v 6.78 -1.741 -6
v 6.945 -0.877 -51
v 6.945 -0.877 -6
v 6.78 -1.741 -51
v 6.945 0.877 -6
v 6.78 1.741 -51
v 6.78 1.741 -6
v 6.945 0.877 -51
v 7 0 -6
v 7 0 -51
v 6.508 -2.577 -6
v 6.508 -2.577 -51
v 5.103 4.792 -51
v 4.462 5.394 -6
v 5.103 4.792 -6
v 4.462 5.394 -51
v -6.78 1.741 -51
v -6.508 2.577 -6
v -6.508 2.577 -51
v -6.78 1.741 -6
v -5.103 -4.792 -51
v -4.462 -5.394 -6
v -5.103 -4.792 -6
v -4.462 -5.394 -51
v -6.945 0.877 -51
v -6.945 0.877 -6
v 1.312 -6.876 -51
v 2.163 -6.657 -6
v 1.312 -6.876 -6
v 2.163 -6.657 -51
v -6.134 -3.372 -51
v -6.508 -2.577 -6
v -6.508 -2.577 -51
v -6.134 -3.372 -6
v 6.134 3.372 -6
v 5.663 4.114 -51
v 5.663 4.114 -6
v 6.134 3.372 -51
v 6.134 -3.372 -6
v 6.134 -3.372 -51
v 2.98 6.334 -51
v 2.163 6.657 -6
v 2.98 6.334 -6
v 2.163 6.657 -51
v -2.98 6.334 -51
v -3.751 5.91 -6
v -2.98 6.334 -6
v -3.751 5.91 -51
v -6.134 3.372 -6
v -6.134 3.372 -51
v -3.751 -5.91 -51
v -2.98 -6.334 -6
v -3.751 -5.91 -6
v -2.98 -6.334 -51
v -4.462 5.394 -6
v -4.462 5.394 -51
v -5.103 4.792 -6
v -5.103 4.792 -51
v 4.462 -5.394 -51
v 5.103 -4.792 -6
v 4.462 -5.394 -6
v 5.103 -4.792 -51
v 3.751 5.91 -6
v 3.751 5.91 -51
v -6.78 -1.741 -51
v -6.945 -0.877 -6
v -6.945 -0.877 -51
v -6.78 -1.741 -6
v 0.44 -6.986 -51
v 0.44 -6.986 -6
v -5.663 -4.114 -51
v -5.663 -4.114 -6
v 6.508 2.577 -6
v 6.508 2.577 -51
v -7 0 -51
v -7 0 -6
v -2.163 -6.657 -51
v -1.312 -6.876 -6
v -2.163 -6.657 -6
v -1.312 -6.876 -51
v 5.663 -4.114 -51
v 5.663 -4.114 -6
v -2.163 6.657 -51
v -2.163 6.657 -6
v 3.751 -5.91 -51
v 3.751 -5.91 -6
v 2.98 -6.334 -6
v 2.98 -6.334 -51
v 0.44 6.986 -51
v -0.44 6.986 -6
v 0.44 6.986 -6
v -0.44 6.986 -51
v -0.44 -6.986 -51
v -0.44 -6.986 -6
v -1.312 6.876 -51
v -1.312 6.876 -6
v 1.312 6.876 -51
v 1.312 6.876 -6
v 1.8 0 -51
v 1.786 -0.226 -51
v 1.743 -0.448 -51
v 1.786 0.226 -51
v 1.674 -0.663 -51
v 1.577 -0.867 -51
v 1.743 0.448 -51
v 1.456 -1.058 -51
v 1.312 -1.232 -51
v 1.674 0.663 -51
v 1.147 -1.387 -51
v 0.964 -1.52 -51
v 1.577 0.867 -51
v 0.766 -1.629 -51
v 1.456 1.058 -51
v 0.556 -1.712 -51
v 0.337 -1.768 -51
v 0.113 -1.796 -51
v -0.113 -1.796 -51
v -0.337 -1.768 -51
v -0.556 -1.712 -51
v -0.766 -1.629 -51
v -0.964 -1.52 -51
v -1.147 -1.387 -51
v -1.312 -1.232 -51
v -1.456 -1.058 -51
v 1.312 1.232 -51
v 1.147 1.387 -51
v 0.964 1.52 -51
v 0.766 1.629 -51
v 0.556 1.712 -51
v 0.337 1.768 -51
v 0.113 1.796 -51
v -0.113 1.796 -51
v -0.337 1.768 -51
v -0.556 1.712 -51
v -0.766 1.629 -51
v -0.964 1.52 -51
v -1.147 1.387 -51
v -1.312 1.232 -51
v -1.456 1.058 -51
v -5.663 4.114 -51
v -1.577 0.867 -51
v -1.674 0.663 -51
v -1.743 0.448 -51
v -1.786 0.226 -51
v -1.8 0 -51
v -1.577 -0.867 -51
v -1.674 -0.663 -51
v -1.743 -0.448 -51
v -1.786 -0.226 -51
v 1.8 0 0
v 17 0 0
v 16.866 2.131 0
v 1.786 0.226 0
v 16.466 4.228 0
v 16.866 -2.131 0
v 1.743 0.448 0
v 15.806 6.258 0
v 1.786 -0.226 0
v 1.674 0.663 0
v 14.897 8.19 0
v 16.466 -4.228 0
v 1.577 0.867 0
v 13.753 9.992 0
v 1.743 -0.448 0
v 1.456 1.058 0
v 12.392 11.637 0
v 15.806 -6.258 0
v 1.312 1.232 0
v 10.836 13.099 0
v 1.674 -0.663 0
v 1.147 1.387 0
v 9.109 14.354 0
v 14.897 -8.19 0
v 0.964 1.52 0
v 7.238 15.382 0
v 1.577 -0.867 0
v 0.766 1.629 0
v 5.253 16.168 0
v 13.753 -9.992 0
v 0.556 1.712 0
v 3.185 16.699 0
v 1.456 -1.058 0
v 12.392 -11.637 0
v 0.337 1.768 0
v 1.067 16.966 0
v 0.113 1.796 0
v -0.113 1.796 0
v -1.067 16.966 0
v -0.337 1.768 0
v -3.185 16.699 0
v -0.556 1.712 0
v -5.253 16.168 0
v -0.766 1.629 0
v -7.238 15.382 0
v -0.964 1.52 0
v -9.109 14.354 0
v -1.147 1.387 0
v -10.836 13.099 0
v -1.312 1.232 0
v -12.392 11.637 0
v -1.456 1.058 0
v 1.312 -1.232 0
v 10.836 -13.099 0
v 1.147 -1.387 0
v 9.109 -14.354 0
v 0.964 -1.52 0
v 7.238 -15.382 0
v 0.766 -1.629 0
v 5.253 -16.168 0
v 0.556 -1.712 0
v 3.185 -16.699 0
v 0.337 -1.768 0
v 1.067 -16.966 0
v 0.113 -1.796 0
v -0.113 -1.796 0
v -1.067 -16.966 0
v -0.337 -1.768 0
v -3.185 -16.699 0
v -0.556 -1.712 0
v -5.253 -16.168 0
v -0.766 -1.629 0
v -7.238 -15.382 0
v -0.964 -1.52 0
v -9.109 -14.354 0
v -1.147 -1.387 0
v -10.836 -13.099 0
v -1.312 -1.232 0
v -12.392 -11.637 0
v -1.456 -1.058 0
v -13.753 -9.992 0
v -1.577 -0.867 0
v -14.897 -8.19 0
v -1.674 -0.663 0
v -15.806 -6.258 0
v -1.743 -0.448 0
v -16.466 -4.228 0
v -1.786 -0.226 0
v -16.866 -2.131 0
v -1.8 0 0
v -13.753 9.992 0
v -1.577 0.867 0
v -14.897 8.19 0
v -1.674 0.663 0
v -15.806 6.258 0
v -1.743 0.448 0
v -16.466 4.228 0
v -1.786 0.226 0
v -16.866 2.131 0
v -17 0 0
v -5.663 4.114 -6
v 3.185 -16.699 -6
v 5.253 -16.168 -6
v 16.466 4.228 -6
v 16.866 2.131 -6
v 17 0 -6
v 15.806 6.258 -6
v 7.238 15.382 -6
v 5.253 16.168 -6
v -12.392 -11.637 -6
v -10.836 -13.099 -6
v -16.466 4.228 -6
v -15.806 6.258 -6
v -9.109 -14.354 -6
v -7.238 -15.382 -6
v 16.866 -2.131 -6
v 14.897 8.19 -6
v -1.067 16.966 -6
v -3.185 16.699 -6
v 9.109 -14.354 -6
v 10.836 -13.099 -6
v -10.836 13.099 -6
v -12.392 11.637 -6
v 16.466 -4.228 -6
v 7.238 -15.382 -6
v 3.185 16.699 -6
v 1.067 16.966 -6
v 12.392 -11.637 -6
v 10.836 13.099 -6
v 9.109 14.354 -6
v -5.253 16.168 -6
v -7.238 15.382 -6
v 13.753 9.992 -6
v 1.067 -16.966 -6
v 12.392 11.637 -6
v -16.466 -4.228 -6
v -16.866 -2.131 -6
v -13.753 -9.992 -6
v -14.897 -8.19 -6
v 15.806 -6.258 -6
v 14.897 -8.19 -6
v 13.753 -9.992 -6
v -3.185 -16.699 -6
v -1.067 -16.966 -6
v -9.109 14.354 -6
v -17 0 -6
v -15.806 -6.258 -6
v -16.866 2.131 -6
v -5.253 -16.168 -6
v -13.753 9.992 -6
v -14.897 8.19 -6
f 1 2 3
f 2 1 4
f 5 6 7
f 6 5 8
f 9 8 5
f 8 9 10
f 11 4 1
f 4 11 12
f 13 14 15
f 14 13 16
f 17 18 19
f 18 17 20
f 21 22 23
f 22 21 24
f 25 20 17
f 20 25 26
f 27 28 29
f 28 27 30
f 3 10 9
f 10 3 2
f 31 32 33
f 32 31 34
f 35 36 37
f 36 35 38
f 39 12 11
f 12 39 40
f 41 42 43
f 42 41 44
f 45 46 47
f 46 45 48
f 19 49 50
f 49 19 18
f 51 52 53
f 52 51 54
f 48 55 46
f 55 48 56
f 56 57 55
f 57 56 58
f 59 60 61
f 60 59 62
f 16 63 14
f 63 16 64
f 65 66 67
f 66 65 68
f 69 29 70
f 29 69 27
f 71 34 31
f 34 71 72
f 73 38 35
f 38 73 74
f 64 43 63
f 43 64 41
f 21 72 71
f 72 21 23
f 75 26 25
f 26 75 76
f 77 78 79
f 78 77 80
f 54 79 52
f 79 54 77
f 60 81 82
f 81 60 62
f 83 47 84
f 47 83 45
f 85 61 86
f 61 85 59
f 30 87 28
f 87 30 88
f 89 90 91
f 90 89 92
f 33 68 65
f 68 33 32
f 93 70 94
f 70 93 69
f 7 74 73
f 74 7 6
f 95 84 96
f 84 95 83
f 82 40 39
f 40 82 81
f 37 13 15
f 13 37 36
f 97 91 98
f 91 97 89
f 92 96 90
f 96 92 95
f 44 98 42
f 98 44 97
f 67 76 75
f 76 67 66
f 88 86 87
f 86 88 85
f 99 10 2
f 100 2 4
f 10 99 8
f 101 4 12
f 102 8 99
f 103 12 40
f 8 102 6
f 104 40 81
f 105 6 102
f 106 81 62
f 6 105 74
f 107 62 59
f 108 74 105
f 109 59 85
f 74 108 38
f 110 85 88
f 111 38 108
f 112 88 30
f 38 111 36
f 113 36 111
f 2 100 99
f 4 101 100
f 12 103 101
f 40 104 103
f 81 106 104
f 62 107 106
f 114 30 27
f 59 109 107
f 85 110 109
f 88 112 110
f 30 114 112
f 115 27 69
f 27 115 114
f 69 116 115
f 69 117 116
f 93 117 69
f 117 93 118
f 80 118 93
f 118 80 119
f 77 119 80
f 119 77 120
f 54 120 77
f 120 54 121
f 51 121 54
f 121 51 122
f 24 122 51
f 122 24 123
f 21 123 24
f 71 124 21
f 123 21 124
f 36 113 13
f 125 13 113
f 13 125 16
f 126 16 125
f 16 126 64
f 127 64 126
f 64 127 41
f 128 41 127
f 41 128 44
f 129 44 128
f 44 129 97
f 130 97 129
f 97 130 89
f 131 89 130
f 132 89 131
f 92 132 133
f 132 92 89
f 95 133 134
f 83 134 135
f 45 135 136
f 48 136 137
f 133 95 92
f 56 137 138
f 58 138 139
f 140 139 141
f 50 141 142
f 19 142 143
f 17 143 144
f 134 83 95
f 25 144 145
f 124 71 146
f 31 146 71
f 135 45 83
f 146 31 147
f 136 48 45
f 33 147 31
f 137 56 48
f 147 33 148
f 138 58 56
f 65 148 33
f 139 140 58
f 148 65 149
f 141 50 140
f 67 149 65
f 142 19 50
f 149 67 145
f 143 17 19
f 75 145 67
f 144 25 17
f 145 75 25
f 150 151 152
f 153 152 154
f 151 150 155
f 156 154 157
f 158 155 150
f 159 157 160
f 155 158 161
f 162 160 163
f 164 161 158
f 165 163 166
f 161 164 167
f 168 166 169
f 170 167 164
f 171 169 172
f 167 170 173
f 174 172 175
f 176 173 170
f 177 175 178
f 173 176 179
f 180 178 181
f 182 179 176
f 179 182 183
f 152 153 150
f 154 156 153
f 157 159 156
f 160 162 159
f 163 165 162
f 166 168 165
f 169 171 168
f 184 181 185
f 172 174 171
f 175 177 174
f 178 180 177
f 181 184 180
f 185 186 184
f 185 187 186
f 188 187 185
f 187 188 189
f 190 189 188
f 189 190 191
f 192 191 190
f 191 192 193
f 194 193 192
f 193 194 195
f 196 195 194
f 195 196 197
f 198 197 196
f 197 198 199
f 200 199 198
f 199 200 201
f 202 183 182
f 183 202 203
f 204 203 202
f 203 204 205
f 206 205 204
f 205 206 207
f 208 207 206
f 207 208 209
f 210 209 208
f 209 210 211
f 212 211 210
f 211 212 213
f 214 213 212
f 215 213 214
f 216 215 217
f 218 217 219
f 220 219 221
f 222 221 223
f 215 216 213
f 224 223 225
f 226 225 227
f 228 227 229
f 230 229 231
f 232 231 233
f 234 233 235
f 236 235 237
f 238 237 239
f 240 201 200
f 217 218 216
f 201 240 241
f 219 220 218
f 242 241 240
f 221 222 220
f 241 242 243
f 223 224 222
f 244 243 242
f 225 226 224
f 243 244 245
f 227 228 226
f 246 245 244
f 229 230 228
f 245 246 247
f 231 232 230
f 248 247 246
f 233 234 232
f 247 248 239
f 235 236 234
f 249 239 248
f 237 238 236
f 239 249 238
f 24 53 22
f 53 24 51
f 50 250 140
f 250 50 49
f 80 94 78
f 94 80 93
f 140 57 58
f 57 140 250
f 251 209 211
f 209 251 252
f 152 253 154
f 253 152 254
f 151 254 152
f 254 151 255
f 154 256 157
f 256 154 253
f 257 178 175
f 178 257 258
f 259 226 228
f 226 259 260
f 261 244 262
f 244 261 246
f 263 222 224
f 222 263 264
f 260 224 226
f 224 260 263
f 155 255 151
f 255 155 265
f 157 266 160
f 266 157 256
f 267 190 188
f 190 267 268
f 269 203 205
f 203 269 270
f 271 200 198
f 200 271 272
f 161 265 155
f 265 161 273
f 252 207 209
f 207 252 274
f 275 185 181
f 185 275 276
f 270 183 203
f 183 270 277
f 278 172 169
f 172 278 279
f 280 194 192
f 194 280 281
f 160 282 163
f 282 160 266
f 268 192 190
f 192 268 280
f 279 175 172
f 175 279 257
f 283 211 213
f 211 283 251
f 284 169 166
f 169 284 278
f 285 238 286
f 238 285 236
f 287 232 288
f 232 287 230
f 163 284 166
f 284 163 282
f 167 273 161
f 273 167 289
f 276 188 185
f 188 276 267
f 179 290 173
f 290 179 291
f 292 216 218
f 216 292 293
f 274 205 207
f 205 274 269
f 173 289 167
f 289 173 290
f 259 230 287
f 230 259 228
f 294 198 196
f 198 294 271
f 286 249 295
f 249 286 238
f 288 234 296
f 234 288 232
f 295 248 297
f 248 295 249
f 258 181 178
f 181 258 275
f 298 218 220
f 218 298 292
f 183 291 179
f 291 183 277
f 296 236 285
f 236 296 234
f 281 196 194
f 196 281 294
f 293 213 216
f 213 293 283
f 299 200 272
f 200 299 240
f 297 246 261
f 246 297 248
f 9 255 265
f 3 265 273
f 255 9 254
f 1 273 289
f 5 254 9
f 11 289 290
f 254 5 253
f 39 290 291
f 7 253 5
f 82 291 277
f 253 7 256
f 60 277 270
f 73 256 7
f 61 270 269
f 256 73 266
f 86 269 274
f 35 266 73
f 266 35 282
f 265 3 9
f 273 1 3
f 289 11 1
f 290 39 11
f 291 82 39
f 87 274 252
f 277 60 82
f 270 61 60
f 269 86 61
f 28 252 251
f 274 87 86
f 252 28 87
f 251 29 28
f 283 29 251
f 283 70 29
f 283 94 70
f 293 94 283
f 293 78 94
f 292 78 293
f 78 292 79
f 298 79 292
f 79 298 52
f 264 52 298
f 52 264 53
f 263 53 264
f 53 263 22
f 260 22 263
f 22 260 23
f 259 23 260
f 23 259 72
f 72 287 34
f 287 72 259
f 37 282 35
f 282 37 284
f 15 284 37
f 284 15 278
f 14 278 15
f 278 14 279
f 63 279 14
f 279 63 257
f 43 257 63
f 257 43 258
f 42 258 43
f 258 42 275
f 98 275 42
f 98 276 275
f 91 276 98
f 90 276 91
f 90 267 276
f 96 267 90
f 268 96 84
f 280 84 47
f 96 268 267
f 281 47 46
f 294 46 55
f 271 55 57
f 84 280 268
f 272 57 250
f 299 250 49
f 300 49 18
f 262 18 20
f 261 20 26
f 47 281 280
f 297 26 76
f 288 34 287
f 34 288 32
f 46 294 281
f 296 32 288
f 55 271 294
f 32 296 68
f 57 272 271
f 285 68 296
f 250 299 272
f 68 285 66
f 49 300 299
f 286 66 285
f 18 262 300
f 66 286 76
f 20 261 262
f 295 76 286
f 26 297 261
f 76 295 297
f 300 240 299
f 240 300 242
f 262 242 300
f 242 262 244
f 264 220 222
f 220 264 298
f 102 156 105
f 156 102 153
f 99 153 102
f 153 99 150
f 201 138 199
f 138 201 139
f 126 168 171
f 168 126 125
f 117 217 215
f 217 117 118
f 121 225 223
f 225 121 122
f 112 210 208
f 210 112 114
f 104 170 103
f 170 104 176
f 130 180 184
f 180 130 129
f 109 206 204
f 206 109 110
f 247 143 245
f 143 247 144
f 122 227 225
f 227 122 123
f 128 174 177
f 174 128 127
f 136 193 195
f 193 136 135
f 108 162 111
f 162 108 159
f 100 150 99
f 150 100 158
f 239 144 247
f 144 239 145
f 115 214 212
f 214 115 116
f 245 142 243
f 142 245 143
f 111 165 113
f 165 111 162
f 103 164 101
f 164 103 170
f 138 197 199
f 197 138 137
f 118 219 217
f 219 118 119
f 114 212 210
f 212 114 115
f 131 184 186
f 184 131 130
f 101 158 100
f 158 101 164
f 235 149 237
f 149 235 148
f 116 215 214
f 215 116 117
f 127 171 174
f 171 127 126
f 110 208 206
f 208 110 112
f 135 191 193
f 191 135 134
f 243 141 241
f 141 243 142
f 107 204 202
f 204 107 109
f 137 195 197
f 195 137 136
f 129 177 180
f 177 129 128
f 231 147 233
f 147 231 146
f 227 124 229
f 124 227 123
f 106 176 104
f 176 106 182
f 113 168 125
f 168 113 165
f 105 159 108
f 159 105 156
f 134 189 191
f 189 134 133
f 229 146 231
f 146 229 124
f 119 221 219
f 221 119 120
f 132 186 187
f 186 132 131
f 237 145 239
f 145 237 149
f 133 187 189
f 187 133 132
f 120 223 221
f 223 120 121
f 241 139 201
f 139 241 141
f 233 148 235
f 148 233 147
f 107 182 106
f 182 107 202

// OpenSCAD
$fn = 50;


difference() {
	union() {
		translate(v = [0, 0, -51.0000000000]) {
			cylinder(h = 51, r = 7.0000000000);
		}
		translate(v = [0, 0, -6.0000000000]) {
			cylinder(h = 6, r = 17.0000000000);
		}
	}
	union() {
		#translate(v = [0, 0, -51]) {
			cylinder(h = 51, r = 1.8000000000);
		}
	}
}
